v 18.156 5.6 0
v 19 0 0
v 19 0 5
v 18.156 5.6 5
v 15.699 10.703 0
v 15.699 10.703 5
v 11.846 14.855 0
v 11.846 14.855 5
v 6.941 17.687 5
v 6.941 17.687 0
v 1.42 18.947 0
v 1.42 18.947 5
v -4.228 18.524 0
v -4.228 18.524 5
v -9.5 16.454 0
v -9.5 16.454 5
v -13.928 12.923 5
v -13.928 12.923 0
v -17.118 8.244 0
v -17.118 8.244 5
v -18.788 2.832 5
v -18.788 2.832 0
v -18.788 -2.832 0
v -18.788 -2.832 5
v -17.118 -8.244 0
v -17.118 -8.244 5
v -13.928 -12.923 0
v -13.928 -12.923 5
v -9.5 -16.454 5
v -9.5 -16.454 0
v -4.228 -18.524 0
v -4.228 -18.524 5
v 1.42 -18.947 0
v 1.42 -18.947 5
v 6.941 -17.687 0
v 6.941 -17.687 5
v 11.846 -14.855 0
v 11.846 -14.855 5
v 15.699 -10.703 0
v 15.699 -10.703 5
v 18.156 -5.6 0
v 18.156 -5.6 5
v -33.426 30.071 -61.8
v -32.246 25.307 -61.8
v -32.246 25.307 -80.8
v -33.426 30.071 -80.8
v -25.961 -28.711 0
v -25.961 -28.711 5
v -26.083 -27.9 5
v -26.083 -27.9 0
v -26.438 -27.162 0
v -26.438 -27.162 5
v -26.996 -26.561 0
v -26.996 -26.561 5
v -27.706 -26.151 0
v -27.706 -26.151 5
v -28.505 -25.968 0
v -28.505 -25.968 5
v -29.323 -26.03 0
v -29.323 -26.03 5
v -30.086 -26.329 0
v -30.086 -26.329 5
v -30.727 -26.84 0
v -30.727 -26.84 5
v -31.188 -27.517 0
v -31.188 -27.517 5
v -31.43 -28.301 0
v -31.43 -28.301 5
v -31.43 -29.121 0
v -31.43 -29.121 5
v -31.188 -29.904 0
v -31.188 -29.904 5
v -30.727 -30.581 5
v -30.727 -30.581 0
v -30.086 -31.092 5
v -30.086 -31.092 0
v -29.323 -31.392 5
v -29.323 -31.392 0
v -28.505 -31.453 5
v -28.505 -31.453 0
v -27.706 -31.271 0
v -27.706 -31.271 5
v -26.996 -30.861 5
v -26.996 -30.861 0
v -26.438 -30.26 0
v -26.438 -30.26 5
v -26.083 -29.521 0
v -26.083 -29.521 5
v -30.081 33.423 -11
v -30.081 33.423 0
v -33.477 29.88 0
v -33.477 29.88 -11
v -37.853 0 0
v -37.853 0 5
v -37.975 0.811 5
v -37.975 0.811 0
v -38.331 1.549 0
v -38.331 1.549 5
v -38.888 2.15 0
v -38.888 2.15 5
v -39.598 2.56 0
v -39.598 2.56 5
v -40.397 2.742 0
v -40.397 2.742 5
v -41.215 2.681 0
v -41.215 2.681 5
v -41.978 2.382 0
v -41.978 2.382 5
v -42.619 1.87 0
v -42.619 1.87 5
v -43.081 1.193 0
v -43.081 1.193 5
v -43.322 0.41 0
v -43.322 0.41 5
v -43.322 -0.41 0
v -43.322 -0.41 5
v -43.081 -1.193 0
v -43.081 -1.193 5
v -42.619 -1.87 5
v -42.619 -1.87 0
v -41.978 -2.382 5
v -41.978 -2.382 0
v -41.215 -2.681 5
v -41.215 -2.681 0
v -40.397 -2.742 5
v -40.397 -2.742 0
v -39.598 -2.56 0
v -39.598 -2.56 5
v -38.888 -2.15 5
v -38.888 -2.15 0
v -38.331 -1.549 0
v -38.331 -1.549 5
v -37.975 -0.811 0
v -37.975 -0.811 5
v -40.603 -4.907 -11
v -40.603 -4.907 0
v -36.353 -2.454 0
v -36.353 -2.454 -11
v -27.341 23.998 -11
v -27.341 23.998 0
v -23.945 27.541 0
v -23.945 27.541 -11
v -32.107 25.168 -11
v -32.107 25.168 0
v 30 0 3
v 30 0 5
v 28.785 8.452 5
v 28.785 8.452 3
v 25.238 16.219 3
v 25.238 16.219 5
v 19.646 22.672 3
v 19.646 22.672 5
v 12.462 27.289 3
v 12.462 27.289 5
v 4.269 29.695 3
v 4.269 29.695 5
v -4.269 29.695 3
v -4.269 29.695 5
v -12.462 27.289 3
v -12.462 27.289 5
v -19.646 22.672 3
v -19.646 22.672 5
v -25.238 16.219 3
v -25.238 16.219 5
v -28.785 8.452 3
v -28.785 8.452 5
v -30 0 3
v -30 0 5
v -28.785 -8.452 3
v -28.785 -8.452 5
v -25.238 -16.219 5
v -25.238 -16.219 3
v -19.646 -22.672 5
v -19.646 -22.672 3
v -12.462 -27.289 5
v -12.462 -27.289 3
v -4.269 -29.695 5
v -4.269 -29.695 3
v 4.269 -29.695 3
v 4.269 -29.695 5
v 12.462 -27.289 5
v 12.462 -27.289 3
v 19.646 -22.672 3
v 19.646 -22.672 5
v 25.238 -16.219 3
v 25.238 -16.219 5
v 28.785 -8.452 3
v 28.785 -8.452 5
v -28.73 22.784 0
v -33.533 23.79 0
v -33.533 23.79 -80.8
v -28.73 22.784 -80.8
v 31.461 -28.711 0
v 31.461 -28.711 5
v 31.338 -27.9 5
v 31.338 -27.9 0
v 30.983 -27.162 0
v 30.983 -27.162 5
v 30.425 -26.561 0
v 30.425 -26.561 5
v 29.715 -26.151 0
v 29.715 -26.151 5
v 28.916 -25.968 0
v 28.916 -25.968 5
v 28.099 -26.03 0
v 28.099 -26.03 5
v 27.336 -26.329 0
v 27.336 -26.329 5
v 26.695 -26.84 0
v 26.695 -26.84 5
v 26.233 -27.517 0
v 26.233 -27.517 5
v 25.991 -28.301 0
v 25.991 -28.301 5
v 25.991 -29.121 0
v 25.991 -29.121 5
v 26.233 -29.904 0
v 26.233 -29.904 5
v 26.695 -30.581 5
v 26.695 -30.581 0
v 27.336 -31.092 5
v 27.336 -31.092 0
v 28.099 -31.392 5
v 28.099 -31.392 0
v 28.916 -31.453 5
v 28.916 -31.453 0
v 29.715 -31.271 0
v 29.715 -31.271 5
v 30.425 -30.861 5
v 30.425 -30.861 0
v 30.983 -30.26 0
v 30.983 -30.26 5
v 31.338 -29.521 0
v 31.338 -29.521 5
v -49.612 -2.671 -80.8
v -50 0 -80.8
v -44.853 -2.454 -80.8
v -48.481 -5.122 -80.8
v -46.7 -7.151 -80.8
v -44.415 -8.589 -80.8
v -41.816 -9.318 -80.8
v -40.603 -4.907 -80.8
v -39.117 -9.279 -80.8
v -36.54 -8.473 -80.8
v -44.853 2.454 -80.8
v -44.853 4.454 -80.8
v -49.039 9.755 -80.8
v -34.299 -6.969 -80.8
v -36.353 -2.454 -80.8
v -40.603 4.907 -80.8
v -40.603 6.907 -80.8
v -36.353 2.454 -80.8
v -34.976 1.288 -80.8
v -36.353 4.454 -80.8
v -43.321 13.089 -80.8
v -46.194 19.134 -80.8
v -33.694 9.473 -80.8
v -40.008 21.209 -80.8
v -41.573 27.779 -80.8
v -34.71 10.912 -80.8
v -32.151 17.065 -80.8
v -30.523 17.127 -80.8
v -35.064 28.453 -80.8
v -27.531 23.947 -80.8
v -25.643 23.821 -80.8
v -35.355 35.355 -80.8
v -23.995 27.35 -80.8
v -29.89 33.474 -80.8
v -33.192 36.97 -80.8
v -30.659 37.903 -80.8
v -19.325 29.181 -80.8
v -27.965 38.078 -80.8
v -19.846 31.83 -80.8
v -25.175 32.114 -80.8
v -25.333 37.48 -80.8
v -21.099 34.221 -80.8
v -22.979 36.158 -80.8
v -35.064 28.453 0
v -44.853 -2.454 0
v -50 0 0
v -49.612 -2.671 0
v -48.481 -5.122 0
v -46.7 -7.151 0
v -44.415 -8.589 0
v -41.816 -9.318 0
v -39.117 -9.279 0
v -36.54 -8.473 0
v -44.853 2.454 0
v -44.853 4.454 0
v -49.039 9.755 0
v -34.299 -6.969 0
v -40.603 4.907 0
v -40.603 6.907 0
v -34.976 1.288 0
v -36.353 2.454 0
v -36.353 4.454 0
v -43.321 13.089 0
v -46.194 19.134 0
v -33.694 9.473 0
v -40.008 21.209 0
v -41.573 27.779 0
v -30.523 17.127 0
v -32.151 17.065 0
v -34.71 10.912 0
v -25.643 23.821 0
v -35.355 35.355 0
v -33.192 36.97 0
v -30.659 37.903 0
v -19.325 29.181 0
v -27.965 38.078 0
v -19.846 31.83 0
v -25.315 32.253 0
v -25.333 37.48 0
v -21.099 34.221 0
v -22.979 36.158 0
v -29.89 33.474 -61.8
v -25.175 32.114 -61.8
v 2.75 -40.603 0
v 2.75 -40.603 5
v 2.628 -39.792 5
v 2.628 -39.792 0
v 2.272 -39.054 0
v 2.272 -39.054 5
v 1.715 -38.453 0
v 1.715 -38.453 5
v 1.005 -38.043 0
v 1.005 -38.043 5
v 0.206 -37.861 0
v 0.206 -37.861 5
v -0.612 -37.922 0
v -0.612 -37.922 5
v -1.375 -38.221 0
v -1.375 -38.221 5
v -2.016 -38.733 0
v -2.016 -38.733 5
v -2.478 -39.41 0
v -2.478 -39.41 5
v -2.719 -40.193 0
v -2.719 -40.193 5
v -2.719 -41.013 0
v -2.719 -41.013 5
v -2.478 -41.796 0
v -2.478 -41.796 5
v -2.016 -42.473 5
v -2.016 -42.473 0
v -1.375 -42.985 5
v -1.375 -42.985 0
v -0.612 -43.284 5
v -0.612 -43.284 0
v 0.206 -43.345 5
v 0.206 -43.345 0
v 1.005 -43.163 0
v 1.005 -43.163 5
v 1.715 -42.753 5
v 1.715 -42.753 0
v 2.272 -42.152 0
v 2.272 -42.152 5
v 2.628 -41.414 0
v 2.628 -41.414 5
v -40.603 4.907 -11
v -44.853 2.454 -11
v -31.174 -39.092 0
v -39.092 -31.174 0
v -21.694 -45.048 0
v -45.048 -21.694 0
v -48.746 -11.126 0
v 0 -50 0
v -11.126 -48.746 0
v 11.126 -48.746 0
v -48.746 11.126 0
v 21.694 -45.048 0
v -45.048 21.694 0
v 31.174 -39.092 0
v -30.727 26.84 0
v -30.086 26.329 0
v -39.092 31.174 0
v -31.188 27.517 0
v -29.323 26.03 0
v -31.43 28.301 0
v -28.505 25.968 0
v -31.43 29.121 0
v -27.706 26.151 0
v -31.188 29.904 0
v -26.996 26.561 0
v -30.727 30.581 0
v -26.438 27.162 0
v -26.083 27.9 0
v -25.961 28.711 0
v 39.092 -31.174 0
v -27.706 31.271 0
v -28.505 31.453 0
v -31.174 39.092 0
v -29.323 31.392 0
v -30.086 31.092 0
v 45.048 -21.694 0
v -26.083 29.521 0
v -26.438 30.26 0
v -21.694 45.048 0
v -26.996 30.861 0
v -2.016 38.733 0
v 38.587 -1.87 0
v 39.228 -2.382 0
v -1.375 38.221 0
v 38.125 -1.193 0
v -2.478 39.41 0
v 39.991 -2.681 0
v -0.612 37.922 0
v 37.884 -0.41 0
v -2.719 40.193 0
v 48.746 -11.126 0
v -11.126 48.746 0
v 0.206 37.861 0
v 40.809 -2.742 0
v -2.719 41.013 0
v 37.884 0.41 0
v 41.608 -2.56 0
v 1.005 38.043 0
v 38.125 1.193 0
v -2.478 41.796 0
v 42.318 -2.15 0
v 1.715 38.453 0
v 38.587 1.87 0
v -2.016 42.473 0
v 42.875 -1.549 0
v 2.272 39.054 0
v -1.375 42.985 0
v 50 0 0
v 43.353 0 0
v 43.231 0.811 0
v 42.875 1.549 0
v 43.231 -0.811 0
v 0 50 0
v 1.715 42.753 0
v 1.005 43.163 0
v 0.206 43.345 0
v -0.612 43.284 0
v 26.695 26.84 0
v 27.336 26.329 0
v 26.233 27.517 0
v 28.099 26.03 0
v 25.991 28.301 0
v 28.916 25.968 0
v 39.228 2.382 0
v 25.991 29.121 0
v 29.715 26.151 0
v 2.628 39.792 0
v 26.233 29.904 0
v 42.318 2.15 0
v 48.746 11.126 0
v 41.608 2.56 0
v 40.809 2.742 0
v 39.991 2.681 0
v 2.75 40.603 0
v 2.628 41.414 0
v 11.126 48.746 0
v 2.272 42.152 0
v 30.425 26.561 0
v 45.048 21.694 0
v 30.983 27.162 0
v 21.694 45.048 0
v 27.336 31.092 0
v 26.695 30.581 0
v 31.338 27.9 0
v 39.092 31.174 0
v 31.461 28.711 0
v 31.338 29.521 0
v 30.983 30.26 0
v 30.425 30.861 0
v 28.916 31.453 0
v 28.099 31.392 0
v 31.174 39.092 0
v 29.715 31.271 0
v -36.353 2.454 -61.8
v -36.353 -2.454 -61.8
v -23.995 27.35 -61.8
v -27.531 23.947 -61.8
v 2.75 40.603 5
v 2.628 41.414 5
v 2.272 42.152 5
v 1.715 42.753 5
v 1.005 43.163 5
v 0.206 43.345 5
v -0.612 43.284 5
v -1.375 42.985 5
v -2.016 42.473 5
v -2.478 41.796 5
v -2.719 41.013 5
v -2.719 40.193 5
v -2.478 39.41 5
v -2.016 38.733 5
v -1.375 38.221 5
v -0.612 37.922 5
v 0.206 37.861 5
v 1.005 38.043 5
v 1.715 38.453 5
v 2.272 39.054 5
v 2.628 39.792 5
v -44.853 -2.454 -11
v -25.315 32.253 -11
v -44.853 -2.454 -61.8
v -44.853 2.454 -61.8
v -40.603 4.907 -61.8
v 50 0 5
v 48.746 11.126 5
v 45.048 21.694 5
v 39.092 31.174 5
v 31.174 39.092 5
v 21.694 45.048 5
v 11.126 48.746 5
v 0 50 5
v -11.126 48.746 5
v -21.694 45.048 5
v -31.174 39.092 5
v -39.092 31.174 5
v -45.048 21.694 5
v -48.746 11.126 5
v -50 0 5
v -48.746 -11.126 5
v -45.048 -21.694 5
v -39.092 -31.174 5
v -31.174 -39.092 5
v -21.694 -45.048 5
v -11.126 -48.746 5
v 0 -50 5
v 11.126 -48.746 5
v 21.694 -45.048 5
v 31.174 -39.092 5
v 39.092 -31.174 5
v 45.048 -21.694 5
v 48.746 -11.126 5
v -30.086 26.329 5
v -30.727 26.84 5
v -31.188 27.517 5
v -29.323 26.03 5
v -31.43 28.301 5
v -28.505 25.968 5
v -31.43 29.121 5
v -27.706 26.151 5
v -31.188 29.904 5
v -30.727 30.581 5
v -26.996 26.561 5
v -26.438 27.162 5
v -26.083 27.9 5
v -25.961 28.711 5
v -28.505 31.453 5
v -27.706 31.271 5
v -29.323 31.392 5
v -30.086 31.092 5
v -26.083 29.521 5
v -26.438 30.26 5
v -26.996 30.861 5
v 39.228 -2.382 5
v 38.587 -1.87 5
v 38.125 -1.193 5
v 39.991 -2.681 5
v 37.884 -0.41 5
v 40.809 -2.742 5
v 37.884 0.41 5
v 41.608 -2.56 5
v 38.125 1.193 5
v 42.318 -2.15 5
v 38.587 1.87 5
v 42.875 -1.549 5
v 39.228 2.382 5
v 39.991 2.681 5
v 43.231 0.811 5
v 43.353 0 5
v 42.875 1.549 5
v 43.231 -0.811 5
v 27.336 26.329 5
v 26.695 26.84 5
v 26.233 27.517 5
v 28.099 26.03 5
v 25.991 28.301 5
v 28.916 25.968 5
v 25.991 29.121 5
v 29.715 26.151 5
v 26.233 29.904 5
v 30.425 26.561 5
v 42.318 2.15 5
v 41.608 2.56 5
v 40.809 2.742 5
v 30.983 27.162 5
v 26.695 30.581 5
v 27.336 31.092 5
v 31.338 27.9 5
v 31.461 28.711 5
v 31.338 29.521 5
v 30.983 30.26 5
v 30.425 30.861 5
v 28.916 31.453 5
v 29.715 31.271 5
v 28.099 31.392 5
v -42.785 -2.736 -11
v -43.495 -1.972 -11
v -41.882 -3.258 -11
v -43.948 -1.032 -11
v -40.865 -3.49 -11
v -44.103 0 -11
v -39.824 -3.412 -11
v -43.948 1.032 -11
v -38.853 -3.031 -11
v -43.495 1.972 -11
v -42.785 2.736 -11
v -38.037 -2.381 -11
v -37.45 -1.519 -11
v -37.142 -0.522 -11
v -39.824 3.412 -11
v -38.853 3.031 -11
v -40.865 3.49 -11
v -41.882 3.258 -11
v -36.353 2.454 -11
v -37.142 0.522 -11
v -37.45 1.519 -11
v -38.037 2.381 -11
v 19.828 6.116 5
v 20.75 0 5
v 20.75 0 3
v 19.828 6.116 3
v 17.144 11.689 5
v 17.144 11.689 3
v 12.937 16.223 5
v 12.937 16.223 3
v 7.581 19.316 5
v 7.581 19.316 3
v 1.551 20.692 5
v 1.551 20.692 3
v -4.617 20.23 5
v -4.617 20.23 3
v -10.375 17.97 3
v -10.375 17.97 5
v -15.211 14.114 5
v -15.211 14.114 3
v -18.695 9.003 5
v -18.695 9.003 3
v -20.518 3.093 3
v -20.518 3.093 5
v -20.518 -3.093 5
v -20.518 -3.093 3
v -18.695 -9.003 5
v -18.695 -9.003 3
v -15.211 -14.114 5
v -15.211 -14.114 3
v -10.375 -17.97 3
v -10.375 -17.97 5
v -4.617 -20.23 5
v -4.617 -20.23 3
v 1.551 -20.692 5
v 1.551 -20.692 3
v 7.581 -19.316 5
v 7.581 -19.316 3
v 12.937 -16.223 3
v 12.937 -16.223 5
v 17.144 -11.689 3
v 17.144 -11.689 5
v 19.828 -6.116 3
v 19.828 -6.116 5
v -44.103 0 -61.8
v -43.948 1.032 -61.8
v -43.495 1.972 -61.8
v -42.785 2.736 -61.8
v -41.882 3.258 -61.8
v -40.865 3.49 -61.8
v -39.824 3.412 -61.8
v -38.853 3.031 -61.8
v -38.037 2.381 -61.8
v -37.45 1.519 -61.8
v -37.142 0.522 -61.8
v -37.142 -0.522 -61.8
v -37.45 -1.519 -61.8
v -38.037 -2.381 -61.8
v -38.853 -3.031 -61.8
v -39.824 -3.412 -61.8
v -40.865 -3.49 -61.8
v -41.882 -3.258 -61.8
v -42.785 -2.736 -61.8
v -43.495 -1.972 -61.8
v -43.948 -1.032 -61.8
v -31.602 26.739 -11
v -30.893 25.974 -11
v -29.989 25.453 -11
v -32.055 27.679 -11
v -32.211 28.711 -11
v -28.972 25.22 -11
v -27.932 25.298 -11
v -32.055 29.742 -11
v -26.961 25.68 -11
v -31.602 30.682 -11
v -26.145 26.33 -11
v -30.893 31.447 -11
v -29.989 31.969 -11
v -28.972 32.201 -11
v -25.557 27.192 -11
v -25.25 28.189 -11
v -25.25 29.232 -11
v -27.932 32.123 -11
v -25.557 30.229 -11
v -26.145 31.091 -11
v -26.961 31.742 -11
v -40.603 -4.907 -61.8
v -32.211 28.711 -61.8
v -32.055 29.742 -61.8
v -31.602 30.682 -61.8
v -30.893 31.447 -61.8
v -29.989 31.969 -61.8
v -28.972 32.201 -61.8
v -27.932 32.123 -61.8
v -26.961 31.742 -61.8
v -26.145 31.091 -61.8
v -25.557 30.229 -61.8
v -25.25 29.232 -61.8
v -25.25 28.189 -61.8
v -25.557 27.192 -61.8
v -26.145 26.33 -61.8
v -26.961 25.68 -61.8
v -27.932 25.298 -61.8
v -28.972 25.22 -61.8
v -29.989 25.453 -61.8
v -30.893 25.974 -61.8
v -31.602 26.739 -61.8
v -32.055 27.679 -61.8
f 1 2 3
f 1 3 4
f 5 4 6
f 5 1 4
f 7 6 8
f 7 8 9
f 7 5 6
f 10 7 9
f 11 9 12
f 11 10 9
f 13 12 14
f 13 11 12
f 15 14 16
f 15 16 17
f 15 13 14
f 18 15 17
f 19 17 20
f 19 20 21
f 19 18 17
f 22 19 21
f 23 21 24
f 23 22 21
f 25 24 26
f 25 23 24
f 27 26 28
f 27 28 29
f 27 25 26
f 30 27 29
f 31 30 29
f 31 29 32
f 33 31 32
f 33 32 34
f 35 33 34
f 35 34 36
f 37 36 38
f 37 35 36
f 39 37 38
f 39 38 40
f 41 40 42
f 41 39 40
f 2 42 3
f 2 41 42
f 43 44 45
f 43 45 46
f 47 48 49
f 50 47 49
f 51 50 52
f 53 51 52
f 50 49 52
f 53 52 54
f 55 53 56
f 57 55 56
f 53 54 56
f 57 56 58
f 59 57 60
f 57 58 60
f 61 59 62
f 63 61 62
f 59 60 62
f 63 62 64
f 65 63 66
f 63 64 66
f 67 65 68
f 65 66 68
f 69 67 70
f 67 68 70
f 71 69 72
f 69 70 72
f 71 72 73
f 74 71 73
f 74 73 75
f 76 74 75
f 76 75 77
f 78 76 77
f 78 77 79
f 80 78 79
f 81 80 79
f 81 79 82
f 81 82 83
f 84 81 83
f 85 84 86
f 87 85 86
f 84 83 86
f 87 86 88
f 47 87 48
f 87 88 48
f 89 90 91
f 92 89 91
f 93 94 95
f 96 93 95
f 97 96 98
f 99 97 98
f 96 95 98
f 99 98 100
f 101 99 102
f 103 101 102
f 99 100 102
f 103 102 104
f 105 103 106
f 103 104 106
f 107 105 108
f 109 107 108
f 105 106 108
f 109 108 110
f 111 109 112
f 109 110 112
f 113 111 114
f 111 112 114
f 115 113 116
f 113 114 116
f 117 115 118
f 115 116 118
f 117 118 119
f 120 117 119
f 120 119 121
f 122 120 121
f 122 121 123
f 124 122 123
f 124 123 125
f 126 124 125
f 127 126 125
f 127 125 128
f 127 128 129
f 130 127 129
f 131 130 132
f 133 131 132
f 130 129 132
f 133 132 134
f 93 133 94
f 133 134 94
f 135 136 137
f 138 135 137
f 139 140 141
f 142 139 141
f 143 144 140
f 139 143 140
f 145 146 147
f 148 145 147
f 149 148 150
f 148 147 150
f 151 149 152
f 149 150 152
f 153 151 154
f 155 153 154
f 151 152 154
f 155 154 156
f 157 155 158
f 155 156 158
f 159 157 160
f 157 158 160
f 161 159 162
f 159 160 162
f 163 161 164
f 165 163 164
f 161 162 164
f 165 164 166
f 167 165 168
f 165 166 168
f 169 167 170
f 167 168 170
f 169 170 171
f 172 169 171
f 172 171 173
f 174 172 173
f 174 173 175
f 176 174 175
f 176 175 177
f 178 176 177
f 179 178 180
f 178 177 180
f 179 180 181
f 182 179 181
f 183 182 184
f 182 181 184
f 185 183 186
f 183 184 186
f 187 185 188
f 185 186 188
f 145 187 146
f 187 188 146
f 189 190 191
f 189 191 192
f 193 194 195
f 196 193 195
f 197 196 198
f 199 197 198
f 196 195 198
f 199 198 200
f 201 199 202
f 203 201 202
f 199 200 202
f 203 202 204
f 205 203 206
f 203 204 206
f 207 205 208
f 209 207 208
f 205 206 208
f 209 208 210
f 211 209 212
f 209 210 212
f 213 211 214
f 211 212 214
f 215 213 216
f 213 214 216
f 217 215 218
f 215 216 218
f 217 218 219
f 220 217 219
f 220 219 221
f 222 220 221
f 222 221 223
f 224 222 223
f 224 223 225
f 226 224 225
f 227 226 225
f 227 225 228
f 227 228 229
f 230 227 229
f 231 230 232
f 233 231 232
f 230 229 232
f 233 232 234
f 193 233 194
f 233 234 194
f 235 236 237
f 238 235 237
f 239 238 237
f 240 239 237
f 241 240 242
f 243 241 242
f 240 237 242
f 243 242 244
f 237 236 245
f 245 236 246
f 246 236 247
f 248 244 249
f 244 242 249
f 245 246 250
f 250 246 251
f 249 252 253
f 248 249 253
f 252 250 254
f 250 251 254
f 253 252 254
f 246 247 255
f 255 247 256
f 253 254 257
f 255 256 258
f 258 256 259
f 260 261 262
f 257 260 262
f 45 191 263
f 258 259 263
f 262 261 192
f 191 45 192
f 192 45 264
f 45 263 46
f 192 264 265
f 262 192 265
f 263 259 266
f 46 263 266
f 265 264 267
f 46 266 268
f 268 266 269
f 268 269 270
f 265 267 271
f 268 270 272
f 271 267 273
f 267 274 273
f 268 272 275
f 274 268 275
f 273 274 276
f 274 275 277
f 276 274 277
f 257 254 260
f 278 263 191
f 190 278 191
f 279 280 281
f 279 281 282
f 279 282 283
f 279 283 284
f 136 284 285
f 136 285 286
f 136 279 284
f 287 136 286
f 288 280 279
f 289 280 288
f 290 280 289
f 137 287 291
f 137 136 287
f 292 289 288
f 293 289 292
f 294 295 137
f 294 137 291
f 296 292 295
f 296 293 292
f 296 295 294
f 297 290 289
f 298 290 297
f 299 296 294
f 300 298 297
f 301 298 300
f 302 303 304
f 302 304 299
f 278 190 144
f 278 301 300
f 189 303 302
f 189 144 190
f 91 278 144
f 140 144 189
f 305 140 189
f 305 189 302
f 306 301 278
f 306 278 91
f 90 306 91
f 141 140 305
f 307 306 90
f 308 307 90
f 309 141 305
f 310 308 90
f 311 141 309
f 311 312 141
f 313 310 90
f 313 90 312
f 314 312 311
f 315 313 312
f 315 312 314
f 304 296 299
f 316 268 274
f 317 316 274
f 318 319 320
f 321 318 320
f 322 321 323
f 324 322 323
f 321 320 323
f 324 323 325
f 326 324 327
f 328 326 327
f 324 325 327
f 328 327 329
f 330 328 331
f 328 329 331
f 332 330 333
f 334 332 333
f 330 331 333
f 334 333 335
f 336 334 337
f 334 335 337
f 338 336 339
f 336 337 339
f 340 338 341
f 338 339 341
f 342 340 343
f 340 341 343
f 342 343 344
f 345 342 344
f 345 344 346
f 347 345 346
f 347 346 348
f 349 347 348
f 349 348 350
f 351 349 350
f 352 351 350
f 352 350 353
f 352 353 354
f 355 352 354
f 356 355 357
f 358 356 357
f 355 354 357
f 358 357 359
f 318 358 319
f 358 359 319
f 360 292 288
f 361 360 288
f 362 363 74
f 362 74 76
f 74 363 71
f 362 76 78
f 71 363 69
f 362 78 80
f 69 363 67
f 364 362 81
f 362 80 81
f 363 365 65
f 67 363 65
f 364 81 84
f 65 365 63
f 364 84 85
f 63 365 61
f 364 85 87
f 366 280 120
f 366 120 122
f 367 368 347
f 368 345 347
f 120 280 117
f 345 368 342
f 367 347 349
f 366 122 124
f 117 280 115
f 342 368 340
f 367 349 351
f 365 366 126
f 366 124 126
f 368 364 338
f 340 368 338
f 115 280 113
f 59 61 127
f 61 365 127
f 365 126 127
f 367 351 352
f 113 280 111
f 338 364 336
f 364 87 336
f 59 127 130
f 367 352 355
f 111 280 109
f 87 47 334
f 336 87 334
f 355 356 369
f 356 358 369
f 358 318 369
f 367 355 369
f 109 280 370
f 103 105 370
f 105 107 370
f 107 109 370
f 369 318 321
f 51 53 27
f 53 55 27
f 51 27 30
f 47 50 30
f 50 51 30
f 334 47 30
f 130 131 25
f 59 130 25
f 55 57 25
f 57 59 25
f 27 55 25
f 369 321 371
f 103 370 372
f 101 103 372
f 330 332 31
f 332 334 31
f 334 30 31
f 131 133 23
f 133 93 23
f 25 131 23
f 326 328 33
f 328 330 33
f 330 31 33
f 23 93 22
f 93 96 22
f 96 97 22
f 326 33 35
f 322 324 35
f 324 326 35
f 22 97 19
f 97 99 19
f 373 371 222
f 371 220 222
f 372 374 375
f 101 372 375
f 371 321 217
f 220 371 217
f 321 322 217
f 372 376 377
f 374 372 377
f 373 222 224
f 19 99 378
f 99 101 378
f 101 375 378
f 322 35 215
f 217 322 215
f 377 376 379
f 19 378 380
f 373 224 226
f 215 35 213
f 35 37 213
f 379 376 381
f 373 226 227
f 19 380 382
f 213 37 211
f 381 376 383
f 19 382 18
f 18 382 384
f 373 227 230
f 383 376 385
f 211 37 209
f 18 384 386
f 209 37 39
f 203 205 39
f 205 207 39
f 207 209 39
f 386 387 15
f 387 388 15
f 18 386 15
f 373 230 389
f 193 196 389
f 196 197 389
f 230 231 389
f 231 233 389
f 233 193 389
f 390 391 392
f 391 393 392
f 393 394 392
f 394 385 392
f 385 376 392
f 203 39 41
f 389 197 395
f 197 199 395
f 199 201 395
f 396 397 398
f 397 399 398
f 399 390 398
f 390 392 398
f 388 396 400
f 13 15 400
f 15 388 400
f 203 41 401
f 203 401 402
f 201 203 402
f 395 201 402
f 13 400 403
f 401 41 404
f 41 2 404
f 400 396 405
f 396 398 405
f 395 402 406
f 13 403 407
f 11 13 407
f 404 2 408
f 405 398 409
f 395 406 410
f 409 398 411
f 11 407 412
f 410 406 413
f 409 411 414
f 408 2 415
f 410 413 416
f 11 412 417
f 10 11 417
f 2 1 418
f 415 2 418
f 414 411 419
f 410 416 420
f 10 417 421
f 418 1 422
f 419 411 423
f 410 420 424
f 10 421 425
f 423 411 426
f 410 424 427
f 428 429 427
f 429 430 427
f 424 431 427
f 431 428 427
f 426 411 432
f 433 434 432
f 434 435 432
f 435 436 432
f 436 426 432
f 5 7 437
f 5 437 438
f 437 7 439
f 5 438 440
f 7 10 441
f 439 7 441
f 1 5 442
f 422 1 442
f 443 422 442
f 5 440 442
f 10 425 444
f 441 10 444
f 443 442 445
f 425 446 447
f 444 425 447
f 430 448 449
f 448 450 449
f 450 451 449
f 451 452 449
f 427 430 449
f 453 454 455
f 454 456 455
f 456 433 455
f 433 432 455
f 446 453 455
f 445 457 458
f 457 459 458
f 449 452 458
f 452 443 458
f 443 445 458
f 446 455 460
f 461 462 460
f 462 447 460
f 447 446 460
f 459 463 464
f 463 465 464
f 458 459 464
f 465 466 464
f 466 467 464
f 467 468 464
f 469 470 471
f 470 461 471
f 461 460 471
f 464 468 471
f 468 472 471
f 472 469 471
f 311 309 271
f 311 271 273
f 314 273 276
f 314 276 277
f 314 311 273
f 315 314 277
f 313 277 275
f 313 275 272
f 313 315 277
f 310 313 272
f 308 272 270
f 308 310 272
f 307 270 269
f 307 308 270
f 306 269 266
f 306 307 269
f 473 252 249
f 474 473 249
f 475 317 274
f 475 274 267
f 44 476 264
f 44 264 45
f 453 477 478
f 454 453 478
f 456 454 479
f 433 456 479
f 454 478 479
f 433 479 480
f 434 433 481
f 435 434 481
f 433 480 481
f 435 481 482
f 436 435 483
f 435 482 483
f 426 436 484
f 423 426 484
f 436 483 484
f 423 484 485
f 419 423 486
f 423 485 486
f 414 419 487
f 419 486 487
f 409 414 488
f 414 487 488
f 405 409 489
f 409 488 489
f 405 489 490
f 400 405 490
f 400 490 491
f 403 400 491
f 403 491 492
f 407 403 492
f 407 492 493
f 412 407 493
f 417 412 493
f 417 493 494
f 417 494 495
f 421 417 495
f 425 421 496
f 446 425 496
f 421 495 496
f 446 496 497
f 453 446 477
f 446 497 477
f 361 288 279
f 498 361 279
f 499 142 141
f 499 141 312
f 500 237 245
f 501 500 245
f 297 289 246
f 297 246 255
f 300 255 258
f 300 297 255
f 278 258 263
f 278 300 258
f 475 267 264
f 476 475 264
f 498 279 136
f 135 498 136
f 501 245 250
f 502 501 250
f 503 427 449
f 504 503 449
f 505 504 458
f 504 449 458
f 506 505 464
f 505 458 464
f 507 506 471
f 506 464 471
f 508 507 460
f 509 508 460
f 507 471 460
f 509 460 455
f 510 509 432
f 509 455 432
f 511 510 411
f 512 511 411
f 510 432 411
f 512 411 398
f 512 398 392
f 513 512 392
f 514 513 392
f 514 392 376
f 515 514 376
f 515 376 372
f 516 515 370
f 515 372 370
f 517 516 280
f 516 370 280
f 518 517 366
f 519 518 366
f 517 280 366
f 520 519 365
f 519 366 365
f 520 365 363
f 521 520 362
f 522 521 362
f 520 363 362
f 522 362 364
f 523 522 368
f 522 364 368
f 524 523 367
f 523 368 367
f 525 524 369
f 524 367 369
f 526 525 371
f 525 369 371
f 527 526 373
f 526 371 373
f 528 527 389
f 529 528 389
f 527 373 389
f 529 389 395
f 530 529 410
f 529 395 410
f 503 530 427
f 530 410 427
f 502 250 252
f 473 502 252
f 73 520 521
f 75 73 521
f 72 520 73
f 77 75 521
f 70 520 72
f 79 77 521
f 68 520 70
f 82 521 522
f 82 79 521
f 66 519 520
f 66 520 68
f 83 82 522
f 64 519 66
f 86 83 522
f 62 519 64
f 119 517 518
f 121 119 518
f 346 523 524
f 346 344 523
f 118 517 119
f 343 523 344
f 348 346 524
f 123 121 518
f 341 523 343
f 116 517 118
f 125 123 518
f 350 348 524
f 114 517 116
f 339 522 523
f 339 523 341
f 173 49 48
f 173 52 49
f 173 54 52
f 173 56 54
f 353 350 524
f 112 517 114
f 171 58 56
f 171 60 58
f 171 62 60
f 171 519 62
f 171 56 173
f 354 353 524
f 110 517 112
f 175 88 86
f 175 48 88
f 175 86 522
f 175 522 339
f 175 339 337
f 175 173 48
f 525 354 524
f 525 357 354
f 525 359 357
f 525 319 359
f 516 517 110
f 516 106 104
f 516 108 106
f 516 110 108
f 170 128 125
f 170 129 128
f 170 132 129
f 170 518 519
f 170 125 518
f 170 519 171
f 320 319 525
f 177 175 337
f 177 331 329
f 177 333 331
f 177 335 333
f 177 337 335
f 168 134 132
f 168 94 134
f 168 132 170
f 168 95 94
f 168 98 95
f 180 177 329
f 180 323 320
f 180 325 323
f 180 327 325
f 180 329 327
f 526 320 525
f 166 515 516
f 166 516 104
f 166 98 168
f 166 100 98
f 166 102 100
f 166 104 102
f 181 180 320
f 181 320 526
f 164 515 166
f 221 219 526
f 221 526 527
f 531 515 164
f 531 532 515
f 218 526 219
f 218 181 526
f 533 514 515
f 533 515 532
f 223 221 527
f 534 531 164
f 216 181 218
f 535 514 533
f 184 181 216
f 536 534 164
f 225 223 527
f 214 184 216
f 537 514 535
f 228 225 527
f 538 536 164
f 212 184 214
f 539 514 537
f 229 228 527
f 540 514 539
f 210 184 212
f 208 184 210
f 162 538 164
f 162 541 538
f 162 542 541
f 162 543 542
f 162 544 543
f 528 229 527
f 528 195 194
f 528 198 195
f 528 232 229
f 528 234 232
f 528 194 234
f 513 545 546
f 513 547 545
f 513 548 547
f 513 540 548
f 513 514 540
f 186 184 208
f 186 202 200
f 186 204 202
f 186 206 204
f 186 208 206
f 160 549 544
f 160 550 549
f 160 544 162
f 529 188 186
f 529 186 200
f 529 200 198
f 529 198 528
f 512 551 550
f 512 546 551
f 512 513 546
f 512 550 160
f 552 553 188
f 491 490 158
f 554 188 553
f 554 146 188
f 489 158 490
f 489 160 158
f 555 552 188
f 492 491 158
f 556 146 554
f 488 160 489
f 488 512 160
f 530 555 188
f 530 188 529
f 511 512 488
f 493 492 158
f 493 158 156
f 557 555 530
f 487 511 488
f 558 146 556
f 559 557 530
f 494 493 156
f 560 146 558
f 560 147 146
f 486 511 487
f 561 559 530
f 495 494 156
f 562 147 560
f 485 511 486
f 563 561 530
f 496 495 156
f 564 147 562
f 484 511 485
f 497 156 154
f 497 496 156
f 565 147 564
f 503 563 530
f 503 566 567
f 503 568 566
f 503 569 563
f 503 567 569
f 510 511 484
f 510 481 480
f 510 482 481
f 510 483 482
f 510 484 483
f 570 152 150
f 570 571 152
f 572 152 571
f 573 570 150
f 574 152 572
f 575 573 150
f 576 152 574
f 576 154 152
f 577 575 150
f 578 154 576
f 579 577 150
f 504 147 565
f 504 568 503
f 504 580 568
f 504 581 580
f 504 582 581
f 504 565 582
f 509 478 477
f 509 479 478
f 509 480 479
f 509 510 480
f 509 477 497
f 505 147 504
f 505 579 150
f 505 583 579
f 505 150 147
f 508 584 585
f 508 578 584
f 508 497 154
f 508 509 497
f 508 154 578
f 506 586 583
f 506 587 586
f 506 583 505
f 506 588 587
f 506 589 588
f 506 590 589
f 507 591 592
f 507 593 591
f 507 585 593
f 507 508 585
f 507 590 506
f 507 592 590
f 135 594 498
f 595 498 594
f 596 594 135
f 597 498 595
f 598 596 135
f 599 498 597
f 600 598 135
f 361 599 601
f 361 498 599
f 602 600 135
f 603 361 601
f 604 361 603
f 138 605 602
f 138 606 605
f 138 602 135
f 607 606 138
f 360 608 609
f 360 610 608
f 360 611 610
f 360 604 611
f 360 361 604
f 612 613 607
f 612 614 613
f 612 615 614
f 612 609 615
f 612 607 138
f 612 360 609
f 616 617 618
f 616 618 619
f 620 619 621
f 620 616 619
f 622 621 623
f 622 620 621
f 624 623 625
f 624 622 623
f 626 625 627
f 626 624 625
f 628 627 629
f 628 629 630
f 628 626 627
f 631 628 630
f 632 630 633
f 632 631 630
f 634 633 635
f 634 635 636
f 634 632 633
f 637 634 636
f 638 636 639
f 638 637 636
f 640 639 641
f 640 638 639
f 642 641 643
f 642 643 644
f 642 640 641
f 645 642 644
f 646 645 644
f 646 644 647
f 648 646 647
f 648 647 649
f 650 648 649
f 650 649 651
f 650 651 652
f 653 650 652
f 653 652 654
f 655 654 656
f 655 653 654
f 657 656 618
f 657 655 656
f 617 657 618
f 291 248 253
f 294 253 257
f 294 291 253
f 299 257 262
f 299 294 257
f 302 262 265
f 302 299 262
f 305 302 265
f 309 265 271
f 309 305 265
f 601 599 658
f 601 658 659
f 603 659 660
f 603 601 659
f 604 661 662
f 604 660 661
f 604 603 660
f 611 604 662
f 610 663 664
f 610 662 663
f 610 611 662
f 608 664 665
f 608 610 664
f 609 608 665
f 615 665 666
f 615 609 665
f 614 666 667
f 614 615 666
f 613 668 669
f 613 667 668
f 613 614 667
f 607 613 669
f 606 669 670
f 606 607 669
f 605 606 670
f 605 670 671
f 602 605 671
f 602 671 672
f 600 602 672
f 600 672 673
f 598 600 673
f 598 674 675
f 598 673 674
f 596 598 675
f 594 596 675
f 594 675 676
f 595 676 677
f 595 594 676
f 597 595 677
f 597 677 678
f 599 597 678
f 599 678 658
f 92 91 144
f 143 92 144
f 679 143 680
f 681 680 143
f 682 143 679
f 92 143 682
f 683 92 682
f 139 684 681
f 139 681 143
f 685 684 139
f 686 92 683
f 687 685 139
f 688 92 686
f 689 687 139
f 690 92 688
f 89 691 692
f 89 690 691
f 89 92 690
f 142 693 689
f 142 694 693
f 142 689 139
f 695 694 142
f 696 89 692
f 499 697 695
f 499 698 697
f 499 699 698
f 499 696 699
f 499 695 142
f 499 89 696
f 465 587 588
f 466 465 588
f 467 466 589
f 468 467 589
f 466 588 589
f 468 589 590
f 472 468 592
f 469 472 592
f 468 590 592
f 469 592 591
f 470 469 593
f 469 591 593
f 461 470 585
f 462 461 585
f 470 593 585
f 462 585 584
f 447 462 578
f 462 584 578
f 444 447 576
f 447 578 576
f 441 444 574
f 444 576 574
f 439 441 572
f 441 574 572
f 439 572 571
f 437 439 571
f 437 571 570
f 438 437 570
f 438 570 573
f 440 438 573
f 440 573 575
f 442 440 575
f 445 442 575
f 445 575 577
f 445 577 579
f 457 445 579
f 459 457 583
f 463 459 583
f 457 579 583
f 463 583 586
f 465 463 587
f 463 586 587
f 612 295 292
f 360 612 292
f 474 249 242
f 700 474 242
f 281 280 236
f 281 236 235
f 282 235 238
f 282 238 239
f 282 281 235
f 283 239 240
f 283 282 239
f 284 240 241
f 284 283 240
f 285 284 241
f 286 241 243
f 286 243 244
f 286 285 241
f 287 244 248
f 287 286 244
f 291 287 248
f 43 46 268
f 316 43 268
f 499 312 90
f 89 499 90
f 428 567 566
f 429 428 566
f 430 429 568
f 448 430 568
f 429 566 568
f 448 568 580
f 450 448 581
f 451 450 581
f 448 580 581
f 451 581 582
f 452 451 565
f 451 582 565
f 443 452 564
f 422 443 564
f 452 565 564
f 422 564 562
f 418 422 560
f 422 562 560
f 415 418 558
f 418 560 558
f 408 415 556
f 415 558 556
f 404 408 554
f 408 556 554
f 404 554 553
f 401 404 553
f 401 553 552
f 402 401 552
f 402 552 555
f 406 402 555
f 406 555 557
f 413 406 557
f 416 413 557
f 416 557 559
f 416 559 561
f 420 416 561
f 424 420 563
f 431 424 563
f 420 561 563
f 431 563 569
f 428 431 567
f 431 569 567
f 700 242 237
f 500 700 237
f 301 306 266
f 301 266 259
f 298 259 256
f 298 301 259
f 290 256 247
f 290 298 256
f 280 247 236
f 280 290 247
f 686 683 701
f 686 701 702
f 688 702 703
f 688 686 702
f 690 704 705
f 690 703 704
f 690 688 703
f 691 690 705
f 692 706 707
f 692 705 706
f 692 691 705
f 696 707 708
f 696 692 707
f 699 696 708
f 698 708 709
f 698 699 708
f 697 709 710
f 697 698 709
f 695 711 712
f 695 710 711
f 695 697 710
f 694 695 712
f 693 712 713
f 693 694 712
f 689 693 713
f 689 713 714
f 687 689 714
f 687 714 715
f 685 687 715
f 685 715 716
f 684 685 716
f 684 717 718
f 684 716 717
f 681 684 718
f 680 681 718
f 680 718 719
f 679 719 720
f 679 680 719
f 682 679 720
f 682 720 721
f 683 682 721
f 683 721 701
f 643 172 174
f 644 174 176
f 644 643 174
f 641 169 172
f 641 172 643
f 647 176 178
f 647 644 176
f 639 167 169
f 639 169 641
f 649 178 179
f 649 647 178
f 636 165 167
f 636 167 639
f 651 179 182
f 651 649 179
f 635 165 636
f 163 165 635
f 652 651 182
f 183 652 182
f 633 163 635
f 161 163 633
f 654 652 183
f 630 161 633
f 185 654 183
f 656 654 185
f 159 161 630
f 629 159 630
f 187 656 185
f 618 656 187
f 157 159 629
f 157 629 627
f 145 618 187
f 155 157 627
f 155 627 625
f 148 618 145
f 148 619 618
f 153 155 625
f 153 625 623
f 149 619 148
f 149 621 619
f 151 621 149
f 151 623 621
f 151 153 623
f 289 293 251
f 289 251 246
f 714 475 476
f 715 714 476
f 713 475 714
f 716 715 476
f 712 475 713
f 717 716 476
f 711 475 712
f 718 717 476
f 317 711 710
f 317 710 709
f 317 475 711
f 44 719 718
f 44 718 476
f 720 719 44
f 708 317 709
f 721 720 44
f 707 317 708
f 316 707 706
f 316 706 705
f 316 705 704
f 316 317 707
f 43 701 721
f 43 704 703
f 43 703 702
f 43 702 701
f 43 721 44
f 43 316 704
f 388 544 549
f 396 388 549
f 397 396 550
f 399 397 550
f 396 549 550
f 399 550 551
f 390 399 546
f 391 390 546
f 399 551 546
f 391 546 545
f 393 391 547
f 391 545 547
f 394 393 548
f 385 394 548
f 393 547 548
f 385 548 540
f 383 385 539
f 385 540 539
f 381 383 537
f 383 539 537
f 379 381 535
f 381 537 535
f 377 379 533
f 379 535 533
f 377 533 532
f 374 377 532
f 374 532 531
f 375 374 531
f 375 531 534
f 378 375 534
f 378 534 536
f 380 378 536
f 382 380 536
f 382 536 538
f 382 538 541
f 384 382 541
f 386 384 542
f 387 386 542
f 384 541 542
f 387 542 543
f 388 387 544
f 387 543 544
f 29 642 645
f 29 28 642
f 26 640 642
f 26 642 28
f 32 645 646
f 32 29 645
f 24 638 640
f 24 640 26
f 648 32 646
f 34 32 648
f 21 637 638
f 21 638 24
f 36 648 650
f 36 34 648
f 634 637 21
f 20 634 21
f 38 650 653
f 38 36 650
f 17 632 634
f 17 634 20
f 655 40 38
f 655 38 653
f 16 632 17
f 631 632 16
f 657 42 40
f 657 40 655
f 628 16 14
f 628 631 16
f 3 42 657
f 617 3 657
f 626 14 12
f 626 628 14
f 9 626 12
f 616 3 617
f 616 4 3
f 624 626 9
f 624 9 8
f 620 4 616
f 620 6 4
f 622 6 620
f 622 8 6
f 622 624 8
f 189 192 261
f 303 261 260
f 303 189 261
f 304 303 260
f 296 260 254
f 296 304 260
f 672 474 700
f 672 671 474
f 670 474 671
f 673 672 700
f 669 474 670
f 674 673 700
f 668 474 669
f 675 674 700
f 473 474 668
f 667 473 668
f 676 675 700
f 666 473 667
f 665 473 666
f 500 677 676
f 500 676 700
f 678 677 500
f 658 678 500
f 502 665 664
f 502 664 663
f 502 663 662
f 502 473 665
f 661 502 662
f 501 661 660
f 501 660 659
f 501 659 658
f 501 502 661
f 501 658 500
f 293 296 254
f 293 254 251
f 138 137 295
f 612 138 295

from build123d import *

# Parameters (mm, degrees)
CROQUIS1_R              = 50
CROQUIS1_R_2            = 19
SALIENTE_EXTRUIR1_DEPTH = 5
CROQUIS4_R              = 30
CROQUIS4_R_2            = 20.75
CORTAR_EXTRUIR1_DEPTH   = 2
CROQUIS5_R              = 2.75
CORTAR_EXTRUIR2_DEPTH   = 5
CROQUIS8_R              = 3.5
SALIENTE_EXTRUIR2_DEPTH = 80.8
CORTAR_EXTRUIR3_DEPTH   = 11
CORTAR_EXTRUIR4_DEPTH   = 19
CORTAR_EXTRUIR5_DEPTH   = 80.8


with BuildPart() as part:
    # Croquis1 → Saliente-Extruir1 (new body)
    with BuildSketch(Plane.XY):
        Circle(CROQUIS1_R)
        Circle(CROQUIS1_R_2, mode=Mode.SUBTRACT)
    extrude(amount=SALIENTE_EXTRUIR1_DEPTH)

    # Croquis4 → Cortar-Extruir1 (cut)
    with BuildSketch(Plane.XY.offset(5)):
        Circle(CROQUIS4_R)
        Circle(CROQUIS4_R_2, mode=Mode.SUBTRACT)
    extrude(amount=-CORTAR_EXTRUIR1_DEPTH, mode=Mode.SUBTRACT)

    # Croquis5 → Cortar-Extruir2 (cut)
    with BuildSketch(Plane.XY.offset(5)):
        with Locations((40.602997929, 0)):
            Circle(CROQUIS5_R)
        with Locations((28.710655172, -28.710655172)):
            Circle(CROQUIS5_R)
        with Locations((0, -40.602997929)):
            Circle(CROQUIS5_R)
        with Locations((-28.710655172, -28.710655172)):
            Circle(CROQUIS5_R)
        with Locations((-40.602997929, 0)):
            Circle(CROQUIS5_R)
        with Locations((-28.710655172, 28.710655172)):
            Circle(CROQUIS5_R)
        with Locations((0, 40.602997929)):
            Circle(CROQUIS5_R)
        with Locations((28.710655172, 28.710655172)):
            Circle(CROQUIS5_R)
    extrude(amount=-CORTAR_EXTRUIR2_DEPTH, mode=Mode.SUBTRACT)


with BuildPart() as body_2:
    # Croquis8 → Saliente-Extruir2 (new body)
    with BuildSketch(Plane(origin=(0, 0, 0), x_dir=(-1, 0, 0), z_dir=(0, 0, -1))):
        with BuildLine():
            ThreePointArc((34.299188914, -6.96890521), (32.335783638, 13.393920133), (19.325428939, 29.180949202))
            ThreePointArc((19.325428939, 29.180949202), (25.333020554, 37.479647834), (35.355339059, 35.355339059))
            ThreePointArc((35.355339059, 35.355339059), (46.193976626, 19.134171618), (50, 0))
            ThreePointArc((50, 0), (44.415263761, -8.588962518), (34.299188914, -6.96890521))
        make_face()
        with Locations((28.710655172, 28.710655172)):
            Circle(CROQUIS8_R, mode=Mode.SUBTRACT)
        with Locations((40.602997929, 0)):
            Circle(CROQUIS8_R, mode=Mode.SUBTRACT)
    extrude(amount=SALIENTE_EXTRUIR2_DEPTH)

    # Croquis9 → Cortar-Extruir3 (cut)
    with BuildSketch(Plane.XY):
        Polygon((-40.602997929, 4.907477288), (-44.852997929, 2.453738644), (-44.852997929, -2.453738644), (-40.602997929, -4.907477288), (-36.352997929, -2.453738644), (-36.352997929, 2.453738644), align=None)
        Polygon((-23.944605203, 27.540996663), (-25.314676205, 32.253346266), (-30.080726173, 33.423004776), (-33.476705141, 29.880313682), (-32.10663414, 25.167964078), (-27.340584171, 23.998305569), align=None)
    extrude(amount=-CORTAR_EXTRUIR3_DEPTH, mode=Mode.SUBTRACT)

    # Croquis10 → Cortar-Extruir4 (cut)
    with BuildSketch(Plane(origin=(0, 0, -80.8), x_dir=(-1, 0, 0), z_dir=(0, 0, -1))):
        Polygon((27.531125839, 23.947038491), (32.246303566, 25.307344465), (33.425832898, 30.070961146), (29.890184505, 33.474271853), (25.175006779, 32.11396588), (23.995477446, 27.350349198), align=None)
        Polygon((40.602997929, -4.907477288), (44.852997929, -2.453738644), (44.852997929, 2.453738644), (40.602997929, 4.907477288), (36.352997929, 2.453738644), (36.352997929, -2.453738644), align=None)
    extrude(amount=-CORTAR_EXTRUIR4_DEPTH, mode=Mode.SUBTRACT)

    # Croquis13 → Cortar-Extruir5 (cut)
    with BuildSketch(Plane.XY):
        with BuildLine():
            ThreePointArc((-44.852997929, 4.453738644), (-41.879481545, 17.236692785), (-35.064212145, 28.452655483))
            Line((-35.064212145, 28.452655483), (-33.533462291, 23.79002337))
            Line((-33.533462291, 23.79002337), (-28.730129506, 22.784375575))
            ThreePointArc((-28.730129506, 22.784375575), (-33.541663712, 14.034952678), (-36.352997929, 4.453738644))
            Line((-36.352997929, 4.453738644), (-40.602997929, 6.907477288))
            Line((-40.602997929, 6.907477288), (-44.852997929, 4.453738644))
        make_face()
    extrude(amount=-CORTAR_EXTRUIR5_DEPTH, mode=Mode.SUBTRACT)


solid = Compound([part.part, body_2.part])
